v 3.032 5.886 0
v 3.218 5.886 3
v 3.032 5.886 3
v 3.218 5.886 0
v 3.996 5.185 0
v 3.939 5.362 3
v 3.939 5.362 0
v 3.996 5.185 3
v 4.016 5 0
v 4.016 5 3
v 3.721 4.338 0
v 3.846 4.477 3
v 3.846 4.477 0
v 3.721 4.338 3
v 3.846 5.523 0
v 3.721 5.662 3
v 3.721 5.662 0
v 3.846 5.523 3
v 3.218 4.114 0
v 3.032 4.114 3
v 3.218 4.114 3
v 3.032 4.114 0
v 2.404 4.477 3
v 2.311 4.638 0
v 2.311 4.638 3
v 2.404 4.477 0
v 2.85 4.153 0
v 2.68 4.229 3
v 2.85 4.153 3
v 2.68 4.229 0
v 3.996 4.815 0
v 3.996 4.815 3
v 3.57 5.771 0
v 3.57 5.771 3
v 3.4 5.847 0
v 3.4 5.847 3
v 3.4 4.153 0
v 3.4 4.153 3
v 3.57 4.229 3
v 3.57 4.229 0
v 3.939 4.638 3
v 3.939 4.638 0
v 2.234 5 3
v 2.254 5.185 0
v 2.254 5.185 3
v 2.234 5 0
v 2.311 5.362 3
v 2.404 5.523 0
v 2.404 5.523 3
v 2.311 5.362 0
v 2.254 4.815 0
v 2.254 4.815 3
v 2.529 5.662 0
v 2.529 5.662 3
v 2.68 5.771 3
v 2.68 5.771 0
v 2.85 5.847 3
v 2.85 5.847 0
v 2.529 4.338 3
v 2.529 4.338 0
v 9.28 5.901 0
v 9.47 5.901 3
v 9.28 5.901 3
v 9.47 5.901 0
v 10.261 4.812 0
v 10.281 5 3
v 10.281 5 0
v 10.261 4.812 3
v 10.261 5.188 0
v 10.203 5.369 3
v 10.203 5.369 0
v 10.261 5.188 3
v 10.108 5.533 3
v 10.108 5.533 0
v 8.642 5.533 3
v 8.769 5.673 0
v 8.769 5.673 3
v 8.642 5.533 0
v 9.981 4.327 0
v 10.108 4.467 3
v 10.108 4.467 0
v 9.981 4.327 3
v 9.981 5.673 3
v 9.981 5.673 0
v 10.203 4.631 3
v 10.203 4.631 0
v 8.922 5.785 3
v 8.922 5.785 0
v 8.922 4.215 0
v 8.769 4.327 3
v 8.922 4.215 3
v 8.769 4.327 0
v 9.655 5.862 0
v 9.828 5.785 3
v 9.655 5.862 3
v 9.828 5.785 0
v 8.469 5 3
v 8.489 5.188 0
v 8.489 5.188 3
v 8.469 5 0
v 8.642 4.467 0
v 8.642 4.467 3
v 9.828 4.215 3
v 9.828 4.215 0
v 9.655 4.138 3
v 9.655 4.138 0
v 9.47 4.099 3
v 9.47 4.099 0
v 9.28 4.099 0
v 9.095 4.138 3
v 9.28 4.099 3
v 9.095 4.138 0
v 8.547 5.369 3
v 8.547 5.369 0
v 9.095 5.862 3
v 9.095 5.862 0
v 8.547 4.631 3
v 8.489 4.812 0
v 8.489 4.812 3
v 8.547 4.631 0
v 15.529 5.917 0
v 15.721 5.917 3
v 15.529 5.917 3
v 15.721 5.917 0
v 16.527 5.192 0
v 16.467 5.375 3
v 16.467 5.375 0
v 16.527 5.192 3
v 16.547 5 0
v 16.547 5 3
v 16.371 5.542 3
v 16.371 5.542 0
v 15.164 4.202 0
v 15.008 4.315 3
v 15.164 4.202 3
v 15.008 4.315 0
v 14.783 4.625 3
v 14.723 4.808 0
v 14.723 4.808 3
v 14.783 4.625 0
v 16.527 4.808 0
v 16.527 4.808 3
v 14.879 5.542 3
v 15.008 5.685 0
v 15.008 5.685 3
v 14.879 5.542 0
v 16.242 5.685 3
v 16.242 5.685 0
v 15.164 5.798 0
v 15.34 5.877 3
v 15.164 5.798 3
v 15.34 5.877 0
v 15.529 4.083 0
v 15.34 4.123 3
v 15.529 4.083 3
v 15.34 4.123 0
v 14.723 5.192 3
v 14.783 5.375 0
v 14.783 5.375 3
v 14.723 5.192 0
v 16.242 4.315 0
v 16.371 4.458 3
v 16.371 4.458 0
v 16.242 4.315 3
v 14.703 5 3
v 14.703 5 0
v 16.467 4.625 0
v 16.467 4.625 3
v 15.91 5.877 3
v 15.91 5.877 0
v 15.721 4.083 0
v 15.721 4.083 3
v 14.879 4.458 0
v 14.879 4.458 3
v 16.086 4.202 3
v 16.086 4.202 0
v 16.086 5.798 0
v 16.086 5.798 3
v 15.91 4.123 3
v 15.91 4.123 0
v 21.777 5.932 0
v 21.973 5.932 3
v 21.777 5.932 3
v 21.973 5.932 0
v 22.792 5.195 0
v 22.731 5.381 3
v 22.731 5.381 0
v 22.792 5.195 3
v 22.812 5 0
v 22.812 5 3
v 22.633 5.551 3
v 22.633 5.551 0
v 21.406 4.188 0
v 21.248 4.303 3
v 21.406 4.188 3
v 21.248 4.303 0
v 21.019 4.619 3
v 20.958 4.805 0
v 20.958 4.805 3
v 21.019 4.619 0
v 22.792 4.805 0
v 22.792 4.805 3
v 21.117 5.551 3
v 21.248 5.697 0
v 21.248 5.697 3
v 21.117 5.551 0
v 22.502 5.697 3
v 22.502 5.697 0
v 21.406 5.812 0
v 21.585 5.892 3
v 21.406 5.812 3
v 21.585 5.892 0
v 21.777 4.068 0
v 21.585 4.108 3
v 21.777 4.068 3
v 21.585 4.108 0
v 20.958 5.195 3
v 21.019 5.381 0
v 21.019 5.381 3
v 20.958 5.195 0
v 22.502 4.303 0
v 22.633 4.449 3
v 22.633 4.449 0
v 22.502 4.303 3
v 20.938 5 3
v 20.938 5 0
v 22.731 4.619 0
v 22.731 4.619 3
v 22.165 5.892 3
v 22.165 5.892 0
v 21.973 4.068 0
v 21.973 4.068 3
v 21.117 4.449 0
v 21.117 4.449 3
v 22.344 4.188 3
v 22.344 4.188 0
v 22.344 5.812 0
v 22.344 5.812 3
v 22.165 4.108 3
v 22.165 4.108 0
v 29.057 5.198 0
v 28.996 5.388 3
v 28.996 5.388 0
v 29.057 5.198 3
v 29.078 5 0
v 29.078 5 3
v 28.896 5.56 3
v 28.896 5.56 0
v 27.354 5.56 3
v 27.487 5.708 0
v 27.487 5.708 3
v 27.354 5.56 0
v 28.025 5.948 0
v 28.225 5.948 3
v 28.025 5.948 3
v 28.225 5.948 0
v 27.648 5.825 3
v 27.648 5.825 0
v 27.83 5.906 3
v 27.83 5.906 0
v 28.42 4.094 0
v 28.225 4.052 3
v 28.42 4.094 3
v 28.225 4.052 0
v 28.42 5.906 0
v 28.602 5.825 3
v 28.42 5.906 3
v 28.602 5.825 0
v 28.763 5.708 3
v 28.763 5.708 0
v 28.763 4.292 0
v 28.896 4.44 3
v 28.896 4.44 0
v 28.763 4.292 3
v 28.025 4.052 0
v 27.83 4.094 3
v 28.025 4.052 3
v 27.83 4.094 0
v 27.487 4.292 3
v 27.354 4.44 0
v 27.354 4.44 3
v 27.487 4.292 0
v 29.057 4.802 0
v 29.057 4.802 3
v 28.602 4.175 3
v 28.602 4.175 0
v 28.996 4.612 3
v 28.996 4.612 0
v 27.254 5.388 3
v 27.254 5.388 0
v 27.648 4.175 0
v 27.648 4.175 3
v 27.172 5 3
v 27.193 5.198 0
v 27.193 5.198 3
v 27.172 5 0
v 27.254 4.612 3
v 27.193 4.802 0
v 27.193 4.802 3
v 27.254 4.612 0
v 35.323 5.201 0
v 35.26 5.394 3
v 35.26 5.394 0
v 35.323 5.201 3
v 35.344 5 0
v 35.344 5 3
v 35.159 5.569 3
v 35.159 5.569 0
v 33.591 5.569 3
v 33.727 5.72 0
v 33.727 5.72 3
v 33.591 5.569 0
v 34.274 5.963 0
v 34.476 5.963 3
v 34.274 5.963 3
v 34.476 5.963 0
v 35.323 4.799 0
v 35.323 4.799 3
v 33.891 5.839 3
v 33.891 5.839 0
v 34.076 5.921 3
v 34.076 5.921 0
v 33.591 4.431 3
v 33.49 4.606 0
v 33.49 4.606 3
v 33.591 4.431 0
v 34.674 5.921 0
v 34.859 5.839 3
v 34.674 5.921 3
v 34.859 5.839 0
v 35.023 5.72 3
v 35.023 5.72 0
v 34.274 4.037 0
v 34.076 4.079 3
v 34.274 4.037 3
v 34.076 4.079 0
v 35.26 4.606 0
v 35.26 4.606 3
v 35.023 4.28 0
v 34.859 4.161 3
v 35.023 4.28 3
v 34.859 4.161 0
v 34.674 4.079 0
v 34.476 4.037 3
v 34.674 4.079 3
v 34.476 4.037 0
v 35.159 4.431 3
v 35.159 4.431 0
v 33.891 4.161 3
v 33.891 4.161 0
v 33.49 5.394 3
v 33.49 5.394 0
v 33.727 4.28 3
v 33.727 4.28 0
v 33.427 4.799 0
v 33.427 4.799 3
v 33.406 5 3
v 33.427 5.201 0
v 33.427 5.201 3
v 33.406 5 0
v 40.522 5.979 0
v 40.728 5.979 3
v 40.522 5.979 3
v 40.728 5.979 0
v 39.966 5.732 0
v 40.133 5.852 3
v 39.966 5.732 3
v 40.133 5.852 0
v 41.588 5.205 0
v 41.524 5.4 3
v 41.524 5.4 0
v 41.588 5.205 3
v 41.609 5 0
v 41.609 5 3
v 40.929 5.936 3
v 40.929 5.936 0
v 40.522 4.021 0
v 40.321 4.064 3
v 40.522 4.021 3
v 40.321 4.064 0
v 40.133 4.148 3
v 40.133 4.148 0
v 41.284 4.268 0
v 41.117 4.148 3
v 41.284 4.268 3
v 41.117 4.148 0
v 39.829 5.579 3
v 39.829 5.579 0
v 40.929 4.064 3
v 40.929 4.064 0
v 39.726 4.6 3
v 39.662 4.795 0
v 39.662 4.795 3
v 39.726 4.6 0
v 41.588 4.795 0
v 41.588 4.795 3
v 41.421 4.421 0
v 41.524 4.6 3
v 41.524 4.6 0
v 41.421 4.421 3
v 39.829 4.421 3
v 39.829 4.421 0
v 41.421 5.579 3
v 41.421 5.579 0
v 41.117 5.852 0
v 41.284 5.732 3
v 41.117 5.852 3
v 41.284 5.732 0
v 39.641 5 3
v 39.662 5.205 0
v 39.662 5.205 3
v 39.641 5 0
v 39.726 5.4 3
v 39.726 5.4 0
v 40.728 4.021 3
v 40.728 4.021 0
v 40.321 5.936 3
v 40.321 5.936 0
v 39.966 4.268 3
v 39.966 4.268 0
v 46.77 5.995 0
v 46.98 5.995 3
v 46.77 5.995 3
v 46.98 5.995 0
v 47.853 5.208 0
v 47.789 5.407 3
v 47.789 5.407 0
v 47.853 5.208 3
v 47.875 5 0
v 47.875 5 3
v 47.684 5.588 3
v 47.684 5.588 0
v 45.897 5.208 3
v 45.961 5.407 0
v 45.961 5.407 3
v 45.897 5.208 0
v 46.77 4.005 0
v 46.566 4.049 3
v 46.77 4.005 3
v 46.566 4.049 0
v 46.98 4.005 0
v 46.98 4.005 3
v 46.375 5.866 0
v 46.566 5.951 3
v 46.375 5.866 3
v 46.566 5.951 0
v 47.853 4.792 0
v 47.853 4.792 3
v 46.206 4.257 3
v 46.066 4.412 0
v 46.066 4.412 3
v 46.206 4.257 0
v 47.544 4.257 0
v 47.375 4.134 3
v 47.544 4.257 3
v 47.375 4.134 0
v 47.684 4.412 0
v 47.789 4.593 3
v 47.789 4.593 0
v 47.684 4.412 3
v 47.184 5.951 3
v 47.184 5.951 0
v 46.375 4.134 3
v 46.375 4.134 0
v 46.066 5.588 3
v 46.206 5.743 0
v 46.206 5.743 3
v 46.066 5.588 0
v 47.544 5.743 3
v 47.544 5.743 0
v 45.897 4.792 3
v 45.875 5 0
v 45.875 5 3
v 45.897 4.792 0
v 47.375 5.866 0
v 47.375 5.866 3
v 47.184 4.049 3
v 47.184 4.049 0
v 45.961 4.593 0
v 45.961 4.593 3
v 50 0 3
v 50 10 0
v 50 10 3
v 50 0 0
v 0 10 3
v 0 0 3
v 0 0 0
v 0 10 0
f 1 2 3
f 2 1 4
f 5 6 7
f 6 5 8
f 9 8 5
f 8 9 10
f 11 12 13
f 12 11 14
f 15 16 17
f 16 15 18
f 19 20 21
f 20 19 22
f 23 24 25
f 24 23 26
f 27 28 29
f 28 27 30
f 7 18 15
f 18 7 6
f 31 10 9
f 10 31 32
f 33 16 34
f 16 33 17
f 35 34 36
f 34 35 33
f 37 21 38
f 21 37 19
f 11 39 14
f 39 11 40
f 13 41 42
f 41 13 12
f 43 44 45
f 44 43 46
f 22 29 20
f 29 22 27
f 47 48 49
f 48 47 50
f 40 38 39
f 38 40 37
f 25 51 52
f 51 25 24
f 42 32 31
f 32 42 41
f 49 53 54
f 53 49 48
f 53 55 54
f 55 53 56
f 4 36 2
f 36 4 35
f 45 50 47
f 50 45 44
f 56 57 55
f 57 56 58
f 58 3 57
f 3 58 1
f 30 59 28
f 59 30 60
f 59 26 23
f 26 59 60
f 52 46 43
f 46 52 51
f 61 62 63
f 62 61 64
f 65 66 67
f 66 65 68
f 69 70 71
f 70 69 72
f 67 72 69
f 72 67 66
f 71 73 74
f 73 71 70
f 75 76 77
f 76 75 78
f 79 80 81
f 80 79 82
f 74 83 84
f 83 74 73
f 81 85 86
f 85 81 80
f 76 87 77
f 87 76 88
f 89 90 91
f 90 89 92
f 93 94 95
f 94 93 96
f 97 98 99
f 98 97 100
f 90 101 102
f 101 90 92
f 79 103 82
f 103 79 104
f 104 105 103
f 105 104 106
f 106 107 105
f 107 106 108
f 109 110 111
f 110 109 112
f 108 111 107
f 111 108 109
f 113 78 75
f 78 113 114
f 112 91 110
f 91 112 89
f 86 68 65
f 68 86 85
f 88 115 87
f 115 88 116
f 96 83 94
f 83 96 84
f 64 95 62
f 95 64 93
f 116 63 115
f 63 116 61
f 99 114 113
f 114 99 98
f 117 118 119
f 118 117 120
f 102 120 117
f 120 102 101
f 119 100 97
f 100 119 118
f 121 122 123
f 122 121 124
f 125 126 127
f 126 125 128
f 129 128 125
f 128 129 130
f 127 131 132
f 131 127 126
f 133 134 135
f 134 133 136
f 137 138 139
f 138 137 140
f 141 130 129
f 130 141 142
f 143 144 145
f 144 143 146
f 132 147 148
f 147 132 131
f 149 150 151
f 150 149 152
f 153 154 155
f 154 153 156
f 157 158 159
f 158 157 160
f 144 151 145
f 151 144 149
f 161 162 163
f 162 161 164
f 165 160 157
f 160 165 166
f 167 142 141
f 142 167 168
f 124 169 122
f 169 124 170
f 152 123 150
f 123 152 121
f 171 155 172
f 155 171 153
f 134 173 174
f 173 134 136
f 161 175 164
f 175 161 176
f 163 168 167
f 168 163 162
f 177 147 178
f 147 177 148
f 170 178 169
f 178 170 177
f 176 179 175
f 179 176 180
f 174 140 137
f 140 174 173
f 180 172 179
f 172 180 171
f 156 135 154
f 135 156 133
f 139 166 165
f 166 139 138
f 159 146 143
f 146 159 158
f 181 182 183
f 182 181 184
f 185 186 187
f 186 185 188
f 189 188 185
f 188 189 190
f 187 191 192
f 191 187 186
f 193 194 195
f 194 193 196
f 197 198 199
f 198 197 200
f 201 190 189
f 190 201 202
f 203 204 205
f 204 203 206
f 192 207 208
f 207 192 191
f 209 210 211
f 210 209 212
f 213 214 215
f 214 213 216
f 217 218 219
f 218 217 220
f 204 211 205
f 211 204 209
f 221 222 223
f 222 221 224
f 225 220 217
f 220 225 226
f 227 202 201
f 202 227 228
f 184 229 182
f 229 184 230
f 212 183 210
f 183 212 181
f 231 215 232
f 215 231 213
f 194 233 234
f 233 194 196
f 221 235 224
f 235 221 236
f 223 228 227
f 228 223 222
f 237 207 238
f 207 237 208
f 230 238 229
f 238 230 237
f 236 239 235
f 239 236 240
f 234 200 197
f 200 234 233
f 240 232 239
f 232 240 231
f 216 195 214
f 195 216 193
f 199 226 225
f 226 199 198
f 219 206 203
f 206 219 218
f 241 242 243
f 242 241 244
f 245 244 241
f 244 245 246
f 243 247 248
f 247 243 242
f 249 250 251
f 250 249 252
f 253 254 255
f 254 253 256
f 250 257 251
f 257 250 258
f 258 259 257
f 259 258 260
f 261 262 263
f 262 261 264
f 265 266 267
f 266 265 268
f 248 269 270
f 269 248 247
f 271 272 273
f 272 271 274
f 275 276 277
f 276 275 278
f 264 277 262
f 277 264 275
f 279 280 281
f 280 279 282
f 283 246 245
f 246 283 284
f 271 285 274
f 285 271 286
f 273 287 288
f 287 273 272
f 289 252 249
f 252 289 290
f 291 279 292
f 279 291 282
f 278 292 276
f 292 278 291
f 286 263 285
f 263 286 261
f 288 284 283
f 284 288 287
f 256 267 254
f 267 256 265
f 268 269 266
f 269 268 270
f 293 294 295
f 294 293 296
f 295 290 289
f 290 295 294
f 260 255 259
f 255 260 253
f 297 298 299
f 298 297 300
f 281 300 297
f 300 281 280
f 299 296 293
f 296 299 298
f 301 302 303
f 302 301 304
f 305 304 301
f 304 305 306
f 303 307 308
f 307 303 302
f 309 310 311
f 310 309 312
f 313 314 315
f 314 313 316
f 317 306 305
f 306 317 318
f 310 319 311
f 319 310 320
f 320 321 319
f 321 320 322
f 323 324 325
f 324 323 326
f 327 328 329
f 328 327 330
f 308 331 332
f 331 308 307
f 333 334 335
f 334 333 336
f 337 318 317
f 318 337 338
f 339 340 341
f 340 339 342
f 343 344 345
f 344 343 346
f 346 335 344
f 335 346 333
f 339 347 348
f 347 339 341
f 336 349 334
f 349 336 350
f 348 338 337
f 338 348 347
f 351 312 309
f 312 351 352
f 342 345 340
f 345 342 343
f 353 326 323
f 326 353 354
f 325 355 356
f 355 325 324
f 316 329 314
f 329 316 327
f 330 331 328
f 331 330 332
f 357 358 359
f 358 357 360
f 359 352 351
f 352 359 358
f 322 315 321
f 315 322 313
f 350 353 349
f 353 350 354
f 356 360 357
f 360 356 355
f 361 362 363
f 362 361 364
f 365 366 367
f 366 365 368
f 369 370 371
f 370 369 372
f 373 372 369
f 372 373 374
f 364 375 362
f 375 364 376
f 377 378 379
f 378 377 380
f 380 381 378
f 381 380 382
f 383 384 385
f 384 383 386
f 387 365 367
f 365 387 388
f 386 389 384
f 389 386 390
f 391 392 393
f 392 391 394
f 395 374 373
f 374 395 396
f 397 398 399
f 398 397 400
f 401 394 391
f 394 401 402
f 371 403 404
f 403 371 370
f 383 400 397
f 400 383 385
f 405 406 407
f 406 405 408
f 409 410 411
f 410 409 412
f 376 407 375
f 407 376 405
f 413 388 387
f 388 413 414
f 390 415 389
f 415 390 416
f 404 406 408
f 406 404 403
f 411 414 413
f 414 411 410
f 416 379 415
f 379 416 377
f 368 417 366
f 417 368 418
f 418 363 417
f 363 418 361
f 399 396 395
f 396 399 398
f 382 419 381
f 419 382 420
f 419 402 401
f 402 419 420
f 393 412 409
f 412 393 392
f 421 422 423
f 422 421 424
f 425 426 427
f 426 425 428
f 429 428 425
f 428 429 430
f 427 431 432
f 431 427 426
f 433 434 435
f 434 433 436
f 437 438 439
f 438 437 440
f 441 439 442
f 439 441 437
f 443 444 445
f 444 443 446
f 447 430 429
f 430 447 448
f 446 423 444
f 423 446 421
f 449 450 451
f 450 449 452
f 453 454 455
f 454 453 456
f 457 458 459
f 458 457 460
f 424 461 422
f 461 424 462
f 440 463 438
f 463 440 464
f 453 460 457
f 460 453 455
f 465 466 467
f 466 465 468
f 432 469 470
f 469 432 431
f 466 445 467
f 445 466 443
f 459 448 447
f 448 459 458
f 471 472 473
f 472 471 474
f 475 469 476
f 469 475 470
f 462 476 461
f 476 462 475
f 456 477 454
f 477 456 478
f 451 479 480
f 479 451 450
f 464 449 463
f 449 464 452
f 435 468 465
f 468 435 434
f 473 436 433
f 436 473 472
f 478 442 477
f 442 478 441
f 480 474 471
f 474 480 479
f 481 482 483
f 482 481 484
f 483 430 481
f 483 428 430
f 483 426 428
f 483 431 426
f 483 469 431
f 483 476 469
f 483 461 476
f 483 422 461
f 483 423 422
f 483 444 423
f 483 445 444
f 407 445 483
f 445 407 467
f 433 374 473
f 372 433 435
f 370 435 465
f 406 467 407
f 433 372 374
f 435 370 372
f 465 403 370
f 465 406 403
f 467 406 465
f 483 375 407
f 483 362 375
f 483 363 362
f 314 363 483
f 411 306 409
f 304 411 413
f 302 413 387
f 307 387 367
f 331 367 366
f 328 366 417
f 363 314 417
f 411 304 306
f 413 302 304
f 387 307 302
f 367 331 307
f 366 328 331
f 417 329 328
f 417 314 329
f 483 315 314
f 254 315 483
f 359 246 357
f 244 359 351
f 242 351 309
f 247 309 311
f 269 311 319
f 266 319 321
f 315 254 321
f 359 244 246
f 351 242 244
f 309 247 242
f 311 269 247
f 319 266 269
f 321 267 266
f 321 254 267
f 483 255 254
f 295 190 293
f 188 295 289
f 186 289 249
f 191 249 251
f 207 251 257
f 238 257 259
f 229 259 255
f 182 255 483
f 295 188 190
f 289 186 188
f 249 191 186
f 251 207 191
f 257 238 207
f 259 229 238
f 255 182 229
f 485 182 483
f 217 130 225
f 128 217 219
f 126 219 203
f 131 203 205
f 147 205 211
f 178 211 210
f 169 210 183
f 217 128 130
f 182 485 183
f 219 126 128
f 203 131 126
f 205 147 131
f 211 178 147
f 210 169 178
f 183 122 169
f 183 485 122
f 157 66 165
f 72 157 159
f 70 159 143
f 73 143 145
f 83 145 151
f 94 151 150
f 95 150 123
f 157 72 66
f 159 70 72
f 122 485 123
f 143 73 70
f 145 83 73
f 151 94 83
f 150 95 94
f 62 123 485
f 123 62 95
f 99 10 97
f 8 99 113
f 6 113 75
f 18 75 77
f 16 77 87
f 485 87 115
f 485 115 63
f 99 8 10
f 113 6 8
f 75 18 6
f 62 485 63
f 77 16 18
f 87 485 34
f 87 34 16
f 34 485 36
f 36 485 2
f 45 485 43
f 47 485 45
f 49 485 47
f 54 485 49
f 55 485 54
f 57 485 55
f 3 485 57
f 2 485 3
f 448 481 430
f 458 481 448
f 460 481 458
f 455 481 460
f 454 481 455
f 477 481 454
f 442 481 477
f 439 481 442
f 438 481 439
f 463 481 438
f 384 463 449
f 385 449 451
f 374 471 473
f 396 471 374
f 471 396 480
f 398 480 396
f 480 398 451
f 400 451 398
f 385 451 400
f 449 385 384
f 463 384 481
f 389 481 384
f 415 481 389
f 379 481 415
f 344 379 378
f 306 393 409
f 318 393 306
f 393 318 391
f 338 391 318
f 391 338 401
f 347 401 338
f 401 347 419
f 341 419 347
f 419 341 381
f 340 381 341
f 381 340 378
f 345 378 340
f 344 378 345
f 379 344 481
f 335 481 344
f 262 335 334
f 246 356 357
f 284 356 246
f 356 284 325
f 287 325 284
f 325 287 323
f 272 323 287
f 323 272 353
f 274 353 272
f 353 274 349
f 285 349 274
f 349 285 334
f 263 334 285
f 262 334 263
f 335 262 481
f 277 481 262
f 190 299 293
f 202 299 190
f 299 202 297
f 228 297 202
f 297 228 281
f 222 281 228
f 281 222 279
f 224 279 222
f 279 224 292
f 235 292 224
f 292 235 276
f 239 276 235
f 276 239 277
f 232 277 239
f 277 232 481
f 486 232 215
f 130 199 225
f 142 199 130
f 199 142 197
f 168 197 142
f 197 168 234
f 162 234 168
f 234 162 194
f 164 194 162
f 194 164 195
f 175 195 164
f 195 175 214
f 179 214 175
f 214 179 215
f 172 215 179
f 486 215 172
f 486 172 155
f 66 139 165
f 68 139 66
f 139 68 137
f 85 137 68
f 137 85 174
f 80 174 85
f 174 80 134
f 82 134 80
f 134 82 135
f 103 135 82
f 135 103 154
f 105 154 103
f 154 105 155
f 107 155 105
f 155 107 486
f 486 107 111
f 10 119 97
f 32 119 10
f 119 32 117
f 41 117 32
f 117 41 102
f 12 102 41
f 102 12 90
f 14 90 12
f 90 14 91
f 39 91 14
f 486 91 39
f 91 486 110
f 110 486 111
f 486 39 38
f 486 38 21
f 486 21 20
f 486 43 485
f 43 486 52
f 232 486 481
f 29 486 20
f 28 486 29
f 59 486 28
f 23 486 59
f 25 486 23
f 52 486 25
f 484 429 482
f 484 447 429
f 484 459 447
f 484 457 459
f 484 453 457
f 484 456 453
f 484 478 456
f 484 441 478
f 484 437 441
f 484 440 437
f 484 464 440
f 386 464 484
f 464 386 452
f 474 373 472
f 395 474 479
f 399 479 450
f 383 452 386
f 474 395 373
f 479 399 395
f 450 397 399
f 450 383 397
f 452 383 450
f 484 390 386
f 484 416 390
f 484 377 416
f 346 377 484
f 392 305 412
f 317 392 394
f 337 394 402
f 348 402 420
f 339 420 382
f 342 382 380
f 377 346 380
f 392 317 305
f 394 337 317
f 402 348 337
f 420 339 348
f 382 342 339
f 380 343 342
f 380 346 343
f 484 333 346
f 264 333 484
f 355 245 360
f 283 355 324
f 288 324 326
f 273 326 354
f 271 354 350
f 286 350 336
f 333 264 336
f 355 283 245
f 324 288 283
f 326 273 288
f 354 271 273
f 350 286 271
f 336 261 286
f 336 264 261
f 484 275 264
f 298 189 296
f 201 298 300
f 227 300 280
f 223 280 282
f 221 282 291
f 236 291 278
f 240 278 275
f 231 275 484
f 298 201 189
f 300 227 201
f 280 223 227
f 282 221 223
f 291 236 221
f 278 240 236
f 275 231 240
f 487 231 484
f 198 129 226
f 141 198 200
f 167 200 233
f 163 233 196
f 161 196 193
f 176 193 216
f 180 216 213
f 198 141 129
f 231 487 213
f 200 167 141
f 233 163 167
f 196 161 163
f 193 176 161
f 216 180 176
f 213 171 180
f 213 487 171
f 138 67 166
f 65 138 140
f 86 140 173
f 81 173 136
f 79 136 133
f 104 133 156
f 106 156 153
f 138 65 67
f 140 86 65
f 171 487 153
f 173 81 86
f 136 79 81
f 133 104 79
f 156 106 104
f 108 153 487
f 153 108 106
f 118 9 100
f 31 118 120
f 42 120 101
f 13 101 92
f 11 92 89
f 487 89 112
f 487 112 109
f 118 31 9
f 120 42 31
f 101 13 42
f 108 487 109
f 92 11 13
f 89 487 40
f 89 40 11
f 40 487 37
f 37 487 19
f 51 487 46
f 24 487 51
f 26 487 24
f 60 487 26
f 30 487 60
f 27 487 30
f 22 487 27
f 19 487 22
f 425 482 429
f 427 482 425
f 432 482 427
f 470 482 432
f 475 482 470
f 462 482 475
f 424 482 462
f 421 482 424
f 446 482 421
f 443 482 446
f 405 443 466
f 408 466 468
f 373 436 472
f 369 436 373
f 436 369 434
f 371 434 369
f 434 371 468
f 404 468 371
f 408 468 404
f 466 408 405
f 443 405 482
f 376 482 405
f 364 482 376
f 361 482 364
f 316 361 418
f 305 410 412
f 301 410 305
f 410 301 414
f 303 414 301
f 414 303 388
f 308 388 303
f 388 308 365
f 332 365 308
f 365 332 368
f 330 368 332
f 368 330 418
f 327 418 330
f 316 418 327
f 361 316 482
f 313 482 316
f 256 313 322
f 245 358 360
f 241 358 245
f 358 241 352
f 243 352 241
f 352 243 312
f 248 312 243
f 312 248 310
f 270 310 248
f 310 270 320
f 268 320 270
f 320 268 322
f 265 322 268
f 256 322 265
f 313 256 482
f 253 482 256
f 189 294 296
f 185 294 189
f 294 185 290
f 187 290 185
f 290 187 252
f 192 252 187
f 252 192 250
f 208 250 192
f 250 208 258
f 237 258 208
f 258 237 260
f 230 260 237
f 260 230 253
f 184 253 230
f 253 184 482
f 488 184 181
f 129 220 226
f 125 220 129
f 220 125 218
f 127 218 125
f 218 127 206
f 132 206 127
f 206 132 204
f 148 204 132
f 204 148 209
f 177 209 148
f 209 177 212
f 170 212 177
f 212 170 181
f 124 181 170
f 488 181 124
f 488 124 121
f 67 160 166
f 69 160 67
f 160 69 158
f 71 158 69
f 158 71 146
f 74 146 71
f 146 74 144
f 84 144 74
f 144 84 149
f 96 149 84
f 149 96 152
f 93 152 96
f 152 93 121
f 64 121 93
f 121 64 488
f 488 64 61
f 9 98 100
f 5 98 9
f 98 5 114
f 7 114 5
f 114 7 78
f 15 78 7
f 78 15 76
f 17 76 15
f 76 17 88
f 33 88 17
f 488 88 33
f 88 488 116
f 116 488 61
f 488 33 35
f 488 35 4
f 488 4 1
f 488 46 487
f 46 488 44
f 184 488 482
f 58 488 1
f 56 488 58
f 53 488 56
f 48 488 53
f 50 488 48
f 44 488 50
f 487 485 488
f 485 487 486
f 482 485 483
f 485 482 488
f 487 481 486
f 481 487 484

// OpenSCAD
$fn=30;
x=50;
y=10;
z=3;
difMaxMin = 2-1.75;
count = 8;
dif = difMaxMin/count;
hw=(x/count);
difference(){
cube([x,y,z]);
for(i = [1:count]){
    color("red")
    translate([hw*i-(hw/2),y/2,-1])
    cylinder(h = 5,d=1.75+i*dif);
    
    }
}
    
